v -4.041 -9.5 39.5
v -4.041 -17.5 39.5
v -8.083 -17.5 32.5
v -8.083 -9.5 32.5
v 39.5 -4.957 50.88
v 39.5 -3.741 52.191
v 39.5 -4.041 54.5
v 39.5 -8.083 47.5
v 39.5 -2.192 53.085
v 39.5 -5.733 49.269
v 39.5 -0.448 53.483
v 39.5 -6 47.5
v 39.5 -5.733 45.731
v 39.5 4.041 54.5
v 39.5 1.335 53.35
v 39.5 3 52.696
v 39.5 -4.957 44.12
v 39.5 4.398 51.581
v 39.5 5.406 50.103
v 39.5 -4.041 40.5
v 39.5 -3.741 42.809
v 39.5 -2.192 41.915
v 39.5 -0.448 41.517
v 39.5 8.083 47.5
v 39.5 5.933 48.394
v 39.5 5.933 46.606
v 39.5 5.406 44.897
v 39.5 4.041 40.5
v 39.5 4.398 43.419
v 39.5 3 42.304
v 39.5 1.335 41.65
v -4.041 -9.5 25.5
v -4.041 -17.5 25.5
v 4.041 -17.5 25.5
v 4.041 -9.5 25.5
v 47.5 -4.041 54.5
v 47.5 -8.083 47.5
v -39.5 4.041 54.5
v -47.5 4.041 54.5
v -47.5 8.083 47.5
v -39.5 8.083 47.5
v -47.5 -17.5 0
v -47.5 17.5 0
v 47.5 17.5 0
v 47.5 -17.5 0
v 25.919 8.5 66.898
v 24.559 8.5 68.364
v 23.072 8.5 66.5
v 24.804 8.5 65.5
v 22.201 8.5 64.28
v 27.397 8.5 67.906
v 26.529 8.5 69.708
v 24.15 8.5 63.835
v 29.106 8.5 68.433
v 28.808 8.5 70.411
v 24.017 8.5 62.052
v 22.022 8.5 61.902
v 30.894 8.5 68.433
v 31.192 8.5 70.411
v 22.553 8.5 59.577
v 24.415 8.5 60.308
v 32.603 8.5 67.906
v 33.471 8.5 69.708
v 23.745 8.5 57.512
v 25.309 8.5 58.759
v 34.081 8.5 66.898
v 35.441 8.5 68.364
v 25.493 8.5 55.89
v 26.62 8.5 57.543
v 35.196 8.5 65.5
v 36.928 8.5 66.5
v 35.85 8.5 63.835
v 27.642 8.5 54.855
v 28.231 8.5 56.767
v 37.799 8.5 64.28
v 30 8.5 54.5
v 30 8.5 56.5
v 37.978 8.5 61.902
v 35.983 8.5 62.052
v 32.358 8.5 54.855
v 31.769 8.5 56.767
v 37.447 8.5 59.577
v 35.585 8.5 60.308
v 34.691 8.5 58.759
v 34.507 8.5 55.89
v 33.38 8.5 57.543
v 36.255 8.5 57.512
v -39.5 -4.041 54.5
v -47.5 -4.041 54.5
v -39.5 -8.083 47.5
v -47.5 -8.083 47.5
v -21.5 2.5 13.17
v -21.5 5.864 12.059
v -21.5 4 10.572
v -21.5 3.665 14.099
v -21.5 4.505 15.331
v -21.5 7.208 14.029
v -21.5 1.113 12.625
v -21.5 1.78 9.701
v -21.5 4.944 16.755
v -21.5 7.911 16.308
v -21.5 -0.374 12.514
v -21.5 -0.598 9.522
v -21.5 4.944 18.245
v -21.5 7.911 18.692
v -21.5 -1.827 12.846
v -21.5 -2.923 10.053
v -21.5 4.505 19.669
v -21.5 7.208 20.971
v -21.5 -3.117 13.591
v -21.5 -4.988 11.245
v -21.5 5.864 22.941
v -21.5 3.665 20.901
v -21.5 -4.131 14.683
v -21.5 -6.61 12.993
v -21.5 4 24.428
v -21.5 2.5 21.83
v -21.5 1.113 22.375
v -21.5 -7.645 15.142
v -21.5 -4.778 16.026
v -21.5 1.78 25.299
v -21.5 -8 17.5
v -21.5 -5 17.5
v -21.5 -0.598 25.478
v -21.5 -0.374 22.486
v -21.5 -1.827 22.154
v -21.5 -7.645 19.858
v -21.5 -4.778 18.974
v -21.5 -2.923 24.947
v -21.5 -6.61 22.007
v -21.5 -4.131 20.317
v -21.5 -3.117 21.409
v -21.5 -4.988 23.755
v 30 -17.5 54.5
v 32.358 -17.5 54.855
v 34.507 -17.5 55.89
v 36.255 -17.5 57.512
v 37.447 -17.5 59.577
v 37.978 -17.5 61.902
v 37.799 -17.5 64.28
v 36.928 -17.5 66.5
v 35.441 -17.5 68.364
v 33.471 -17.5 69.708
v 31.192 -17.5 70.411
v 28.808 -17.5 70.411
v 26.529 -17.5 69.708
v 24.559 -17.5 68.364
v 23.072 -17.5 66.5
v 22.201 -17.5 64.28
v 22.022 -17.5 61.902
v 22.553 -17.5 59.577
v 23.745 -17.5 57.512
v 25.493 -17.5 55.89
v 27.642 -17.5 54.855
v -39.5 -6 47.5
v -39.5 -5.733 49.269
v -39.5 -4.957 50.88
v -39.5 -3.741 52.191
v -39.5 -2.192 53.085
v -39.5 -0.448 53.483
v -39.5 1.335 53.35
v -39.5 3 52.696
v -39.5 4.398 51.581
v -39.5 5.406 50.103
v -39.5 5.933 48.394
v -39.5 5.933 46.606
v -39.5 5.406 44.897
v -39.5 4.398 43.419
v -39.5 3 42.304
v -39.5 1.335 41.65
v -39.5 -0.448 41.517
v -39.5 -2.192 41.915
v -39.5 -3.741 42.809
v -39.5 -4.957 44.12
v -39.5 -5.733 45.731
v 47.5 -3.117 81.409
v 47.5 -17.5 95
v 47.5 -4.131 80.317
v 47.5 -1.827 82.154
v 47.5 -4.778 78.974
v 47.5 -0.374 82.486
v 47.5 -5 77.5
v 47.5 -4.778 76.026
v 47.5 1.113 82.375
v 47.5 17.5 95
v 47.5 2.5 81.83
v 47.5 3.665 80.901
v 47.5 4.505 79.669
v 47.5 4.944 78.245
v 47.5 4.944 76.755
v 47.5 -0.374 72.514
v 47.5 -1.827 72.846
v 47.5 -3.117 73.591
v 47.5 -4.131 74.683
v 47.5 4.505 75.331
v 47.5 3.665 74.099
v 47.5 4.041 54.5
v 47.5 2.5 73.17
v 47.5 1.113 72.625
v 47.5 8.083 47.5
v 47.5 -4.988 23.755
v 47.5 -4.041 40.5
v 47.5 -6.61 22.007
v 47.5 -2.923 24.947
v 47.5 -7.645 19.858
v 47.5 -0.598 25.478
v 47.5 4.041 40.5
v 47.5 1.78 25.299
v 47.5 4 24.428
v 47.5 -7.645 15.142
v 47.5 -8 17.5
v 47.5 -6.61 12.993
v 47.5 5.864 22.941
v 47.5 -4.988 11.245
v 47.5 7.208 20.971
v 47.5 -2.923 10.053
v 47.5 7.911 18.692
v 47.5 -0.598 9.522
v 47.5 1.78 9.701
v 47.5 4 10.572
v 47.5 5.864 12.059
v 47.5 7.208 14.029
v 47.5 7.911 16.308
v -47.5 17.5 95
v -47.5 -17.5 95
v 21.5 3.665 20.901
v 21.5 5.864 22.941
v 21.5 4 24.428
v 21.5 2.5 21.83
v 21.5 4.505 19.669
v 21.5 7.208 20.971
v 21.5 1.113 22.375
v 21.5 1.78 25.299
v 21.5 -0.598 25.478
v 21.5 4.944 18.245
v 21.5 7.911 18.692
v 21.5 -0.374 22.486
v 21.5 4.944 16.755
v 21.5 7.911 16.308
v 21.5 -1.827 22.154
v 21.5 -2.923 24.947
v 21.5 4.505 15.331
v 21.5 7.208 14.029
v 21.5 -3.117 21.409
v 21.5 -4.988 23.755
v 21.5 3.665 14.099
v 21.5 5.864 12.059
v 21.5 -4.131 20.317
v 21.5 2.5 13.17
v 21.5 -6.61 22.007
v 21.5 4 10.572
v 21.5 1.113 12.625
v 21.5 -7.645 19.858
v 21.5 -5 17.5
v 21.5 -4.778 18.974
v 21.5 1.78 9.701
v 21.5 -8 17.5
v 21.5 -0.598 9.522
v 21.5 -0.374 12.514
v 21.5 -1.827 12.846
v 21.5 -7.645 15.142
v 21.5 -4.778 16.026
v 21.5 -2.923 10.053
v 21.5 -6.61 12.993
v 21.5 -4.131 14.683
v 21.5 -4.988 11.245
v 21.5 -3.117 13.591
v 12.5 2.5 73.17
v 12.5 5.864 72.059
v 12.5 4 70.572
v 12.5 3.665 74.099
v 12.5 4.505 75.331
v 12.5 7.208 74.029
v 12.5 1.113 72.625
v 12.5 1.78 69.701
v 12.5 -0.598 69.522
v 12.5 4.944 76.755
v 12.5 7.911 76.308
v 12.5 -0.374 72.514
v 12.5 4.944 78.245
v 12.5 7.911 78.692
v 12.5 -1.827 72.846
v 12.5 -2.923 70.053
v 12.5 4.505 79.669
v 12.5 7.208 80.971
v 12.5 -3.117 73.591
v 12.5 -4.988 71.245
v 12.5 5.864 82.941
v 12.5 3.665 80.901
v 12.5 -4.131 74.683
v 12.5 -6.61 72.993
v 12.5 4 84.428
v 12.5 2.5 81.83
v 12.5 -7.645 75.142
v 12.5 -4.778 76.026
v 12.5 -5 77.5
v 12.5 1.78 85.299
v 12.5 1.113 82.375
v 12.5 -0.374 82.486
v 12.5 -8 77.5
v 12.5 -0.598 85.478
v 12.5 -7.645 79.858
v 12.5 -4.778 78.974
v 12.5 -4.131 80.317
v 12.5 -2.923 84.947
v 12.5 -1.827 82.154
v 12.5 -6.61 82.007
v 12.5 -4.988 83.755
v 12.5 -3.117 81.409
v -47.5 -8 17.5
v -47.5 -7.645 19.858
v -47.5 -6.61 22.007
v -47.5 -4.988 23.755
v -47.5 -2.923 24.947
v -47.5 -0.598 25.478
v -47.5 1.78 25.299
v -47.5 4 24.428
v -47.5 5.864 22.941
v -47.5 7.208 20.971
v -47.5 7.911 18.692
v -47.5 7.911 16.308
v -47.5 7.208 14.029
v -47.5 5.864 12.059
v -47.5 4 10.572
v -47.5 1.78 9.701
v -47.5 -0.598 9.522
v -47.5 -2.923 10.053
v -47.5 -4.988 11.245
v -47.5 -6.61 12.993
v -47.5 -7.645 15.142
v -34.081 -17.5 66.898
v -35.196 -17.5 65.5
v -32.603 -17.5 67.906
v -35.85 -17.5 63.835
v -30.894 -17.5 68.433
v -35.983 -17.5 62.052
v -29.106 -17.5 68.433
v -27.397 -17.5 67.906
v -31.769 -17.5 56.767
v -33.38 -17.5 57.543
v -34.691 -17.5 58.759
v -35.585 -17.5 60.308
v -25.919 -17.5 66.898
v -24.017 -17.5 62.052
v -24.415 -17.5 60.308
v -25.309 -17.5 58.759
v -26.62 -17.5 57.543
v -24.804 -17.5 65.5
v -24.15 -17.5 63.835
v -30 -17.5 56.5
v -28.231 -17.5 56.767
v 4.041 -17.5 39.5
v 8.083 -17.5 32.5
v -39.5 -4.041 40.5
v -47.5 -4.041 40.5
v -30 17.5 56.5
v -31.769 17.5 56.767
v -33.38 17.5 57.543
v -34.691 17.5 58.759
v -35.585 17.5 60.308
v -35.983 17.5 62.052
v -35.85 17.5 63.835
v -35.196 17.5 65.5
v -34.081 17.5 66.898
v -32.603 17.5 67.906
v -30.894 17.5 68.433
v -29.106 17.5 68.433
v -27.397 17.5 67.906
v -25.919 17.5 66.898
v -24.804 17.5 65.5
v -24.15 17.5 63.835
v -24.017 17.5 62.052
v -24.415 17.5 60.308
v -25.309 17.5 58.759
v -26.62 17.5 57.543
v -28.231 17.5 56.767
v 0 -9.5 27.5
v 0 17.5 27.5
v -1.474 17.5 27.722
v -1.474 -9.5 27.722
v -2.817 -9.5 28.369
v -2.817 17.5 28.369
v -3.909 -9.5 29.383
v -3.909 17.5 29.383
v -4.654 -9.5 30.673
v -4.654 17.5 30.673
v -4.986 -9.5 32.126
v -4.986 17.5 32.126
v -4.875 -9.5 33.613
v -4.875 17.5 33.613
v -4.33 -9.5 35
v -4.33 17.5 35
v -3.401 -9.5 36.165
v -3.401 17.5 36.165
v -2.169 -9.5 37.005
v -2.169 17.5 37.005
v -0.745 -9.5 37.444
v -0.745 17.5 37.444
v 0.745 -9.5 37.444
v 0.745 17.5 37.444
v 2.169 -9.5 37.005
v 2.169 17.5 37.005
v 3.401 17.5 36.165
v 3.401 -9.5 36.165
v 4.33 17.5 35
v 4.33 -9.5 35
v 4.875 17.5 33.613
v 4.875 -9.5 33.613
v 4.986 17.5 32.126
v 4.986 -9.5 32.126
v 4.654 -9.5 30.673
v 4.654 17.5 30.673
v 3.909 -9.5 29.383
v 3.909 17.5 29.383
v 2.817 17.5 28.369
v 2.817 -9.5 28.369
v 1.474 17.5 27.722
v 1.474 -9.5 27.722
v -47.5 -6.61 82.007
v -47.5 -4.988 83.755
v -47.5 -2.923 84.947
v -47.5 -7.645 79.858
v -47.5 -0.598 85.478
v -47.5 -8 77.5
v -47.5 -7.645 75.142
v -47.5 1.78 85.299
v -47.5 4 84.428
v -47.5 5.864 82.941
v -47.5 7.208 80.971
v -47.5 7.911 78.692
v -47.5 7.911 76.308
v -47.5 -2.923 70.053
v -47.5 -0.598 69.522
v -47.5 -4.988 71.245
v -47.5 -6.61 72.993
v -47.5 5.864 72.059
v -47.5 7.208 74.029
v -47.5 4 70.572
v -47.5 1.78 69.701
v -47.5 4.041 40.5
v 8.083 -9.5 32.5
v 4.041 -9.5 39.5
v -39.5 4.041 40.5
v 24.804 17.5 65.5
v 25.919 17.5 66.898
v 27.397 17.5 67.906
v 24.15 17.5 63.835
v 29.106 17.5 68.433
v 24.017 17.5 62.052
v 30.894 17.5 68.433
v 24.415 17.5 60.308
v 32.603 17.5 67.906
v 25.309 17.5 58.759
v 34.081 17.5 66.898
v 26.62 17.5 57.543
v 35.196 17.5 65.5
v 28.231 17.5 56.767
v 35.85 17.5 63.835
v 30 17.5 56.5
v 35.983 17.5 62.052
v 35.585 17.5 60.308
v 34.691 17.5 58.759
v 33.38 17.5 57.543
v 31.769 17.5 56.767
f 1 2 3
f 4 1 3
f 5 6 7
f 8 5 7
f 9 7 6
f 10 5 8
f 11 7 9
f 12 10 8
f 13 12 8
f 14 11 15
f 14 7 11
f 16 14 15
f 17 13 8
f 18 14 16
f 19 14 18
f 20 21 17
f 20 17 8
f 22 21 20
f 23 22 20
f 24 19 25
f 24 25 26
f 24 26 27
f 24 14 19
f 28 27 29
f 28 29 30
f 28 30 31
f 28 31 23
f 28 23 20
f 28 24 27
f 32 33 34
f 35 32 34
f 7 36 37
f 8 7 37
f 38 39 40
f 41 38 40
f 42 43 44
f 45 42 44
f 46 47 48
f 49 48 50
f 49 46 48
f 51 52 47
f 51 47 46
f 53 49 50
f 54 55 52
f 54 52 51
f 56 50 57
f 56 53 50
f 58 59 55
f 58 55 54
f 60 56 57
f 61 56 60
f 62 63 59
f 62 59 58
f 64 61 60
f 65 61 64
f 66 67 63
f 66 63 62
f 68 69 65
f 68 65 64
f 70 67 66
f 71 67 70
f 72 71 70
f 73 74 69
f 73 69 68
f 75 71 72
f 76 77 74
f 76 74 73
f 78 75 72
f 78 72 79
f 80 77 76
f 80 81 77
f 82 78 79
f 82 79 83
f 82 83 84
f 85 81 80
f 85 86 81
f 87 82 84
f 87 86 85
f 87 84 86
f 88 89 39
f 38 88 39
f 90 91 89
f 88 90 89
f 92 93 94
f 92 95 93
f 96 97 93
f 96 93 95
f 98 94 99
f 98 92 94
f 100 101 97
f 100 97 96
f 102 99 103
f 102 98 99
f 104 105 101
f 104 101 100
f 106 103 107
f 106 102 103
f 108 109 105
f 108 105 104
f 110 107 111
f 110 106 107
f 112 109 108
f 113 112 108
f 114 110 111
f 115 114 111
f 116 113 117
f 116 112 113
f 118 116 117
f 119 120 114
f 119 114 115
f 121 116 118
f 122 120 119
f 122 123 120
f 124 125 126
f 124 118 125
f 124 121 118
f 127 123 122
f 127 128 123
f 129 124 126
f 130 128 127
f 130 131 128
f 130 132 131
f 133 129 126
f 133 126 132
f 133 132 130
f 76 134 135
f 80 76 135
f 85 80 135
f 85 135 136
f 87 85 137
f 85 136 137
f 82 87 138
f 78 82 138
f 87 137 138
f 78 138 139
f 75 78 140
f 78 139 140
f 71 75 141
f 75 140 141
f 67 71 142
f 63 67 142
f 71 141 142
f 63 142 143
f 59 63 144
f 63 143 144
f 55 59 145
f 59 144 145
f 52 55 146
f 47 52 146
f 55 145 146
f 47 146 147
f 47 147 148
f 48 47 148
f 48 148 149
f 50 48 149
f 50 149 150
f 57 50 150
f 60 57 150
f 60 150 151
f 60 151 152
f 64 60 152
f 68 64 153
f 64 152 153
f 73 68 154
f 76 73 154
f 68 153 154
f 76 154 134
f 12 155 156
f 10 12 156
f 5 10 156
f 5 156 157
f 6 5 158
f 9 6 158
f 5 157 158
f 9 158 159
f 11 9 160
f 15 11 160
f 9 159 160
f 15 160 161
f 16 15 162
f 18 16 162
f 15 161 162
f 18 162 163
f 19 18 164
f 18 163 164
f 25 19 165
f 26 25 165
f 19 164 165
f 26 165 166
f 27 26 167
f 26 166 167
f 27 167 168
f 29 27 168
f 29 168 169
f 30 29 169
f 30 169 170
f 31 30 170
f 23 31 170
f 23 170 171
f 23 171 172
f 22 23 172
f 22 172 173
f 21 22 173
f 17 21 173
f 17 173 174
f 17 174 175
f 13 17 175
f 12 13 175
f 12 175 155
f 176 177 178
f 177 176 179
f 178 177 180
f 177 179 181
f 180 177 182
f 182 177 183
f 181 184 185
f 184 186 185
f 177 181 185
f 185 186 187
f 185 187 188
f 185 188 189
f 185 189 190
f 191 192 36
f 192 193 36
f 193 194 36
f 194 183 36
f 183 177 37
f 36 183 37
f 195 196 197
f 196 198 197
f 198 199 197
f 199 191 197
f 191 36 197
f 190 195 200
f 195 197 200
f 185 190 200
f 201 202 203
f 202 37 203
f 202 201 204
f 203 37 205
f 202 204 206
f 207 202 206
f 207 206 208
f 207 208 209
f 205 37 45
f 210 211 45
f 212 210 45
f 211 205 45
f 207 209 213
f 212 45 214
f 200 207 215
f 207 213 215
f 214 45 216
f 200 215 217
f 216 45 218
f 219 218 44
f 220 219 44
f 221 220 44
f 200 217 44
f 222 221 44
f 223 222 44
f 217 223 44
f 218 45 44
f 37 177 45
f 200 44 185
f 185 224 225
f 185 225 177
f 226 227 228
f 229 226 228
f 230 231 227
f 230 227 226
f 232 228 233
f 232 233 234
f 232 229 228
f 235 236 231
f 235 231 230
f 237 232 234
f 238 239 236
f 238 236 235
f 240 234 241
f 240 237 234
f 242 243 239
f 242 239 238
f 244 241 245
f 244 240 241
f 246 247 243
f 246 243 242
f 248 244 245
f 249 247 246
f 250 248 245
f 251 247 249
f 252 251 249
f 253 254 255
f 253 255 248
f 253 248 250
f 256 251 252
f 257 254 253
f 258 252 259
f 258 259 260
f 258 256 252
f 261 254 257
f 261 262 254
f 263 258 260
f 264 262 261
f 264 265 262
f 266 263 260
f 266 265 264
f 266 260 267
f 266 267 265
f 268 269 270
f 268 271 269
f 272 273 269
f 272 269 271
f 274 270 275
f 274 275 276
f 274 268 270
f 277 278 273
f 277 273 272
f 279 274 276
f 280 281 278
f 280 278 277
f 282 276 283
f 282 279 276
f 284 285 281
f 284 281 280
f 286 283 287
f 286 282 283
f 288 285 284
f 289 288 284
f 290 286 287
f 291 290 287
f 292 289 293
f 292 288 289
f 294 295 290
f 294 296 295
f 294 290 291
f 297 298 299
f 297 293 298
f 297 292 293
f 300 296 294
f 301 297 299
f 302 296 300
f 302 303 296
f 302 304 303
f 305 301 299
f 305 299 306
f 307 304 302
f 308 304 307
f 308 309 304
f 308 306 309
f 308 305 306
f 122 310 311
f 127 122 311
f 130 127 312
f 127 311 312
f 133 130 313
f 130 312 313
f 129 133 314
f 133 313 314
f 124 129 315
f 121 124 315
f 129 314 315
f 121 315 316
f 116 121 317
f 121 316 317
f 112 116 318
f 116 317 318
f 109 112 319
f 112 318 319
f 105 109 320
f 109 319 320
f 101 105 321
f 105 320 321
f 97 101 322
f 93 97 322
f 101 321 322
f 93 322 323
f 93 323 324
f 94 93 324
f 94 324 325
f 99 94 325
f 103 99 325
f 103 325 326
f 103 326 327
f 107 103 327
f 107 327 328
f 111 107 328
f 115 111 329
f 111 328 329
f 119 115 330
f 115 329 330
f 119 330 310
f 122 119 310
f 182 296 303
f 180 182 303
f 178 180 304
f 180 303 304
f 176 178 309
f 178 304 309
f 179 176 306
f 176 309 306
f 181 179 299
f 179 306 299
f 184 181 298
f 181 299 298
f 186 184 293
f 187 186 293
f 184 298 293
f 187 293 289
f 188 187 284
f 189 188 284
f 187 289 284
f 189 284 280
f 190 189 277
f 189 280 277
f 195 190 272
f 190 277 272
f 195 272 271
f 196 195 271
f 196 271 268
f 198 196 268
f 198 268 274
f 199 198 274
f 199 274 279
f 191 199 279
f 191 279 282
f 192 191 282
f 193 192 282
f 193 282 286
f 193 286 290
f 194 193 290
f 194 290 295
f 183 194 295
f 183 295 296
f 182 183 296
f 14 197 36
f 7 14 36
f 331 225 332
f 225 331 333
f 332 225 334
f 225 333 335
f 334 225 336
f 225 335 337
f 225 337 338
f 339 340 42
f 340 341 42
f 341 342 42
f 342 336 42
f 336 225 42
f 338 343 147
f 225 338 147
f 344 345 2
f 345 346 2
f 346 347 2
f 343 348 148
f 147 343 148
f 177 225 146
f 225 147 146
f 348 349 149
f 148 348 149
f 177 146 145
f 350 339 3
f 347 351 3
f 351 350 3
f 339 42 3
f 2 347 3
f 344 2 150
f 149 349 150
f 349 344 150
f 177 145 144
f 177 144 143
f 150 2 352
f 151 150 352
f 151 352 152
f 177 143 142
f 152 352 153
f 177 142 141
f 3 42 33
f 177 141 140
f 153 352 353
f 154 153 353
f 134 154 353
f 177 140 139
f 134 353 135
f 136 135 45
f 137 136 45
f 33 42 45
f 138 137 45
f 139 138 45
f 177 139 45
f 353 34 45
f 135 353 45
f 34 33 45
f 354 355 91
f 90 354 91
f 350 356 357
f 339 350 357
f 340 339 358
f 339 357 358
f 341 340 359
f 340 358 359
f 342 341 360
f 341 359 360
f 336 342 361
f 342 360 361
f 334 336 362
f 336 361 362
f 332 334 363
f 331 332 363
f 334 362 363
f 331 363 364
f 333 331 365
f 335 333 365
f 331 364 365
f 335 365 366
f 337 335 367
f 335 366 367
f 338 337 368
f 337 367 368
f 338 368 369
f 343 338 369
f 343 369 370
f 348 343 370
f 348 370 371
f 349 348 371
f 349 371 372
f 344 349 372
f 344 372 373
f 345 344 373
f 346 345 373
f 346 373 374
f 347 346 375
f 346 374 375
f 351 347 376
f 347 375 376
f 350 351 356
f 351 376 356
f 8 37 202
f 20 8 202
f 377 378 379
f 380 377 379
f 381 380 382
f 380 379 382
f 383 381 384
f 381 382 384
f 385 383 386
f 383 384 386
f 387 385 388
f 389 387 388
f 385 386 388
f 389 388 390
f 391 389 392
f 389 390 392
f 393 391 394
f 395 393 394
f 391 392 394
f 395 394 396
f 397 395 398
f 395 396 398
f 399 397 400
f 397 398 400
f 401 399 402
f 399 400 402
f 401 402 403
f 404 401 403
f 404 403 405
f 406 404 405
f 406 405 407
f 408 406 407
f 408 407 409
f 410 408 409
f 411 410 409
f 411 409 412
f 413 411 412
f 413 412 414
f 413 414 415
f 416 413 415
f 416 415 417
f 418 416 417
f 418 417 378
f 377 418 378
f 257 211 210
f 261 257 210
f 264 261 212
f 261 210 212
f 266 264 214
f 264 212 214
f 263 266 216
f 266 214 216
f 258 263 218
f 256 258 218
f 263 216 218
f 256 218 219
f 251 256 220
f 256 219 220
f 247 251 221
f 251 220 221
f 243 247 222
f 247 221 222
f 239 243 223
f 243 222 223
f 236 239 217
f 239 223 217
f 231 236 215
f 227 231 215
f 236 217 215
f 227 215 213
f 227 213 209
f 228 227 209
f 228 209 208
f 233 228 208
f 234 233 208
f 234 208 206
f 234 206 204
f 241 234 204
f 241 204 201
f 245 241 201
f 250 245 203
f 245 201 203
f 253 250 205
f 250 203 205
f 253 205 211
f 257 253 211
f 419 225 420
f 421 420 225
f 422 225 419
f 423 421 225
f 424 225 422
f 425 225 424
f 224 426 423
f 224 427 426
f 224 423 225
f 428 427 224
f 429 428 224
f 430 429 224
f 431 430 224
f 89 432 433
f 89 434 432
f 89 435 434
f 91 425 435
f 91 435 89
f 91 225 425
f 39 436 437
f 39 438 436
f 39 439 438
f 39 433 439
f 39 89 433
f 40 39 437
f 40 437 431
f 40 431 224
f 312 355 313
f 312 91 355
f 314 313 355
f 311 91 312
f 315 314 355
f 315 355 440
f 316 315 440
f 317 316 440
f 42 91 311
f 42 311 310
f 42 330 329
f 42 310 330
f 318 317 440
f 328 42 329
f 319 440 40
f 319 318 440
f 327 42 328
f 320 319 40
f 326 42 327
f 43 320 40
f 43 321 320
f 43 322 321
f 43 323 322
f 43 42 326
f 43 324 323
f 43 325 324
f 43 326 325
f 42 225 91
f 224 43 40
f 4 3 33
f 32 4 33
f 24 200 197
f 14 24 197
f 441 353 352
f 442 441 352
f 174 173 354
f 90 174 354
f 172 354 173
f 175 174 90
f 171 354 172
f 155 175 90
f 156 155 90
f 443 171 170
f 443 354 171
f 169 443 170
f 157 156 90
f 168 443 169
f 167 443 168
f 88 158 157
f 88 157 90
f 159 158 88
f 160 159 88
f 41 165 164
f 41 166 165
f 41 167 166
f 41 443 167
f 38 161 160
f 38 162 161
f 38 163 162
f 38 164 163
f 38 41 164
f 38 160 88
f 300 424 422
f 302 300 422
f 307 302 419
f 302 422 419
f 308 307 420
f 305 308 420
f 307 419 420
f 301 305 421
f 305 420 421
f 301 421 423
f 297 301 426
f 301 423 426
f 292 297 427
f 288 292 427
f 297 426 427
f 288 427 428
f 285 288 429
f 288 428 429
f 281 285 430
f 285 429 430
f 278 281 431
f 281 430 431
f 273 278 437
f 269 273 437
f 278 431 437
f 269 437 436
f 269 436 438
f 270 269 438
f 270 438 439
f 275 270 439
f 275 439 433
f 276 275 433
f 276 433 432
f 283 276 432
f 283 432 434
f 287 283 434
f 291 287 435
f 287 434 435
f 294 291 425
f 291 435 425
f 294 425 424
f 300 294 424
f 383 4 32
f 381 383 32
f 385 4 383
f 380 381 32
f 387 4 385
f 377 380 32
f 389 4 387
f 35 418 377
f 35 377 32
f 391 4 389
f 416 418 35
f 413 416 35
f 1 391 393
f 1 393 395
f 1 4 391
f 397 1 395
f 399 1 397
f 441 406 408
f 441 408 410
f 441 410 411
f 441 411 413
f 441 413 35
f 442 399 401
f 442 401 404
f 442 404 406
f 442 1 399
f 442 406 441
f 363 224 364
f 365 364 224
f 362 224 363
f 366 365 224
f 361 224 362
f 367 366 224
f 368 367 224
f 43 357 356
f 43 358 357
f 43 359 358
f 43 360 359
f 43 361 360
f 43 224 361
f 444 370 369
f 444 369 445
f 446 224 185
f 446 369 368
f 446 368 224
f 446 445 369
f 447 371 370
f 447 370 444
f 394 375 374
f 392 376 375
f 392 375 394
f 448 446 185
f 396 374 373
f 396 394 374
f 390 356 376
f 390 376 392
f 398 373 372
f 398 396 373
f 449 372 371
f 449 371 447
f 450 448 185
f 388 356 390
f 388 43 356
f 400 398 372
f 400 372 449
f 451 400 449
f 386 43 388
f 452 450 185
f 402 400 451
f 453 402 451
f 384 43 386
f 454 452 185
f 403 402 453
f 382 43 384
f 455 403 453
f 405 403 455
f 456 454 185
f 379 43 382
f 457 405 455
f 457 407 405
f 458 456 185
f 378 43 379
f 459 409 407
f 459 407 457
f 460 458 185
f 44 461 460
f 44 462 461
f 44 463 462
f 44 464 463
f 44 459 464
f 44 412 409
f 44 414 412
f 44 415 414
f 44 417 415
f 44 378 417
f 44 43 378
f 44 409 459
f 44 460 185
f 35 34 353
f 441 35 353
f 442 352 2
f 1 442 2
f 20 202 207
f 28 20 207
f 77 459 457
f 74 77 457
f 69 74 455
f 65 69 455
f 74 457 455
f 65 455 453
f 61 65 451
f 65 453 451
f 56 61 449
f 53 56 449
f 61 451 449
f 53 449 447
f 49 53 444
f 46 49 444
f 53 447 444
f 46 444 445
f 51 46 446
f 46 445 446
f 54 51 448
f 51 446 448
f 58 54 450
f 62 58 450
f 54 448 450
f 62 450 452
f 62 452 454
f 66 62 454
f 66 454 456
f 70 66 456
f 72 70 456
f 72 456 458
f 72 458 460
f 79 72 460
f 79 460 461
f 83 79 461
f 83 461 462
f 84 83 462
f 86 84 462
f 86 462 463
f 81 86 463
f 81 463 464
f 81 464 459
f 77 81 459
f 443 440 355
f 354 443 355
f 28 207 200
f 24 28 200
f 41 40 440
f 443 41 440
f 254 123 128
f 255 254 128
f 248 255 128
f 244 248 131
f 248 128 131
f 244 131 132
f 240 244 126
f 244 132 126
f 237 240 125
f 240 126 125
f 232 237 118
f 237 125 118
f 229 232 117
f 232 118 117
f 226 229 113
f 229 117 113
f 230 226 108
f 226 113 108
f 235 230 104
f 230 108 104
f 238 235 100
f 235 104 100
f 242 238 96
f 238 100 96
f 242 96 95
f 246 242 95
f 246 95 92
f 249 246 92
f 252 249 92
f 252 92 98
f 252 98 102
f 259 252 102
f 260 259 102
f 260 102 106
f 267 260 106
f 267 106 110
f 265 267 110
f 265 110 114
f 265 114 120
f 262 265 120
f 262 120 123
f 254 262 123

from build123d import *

# Parameters (mm, degrees)
SKETCH1_W           = 95
SKETCH1_H           = 35
BOSS_EXTRUDE1_DEPTH = 95
SKETCH2_R           = 5
SKETCH2_R_2         = 6
CUT_EXTRUDE1_DEPTH  = 95
SKETCH3_R           = 8
CUT_EXTRUDE2_DEPTH  = 26
SKETCH4_R           = 8
CUT_EXTRUDE3_DEPTH  = 60
SKETCH5_R           = 8
CUT_EXTRUDE4_DEPTH  = 26
SKETCH6_R           = 5
SKETCH6_R_2         = 6
CUT_EXTRUDE5_DEPTH  = 35
SKETCH8_R           = 8
CUT_EXTRUDE7_DEPTH  = 26
CUT_EXTRUDE10_DEPTH = 8
CUT_EXTRUDE14_DEPTH = 8
CUT_EXTRUDE15_DEPTH = 8


with BuildPart() as part:
    # Sketch1 → Boss-Extrude1 (new body)
    with BuildSketch(Plane.XY):
        Rectangle(SKETCH1_W, SKETCH1_H)
    extrude(amount=BOSS_EXTRUDE1_DEPTH)

    # Sketch2 → Cut-Extrude1 (cut)
    with BuildSketch(Plane.ZY.offset(47.5)):
        with Locations(Location((17.5, 0, 0), (0, 0, 270))):  # turned: the seam where the file's is
            Circle(SKETCH2_R)
        with Locations(Location((47.5, 0, 0), (0, 0, 270))):  # turned: the seam where the file's is
            Circle(SKETCH2_R_2)
        with Locations(Location((77.5, 0, 0), (0, 0, 270))):  # turned: the seam where the file's is
            Circle(SKETCH2_R)
    extrude(amount=-CUT_EXTRUDE1_DEPTH, mode=Mode.SUBTRACT)

    # Sketch3 → Cut-Extrude2 (cut)
    with BuildSketch(Plane.ZY.offset(47.5)):
        with Locations(Location((17.5, 0, 0), (0, 0, 270))):  # turned: the seam where the file's is
            Circle(SKETCH3_R)
    extrude(amount=-CUT_EXTRUDE2_DEPTH, mode=Mode.SUBTRACT)

    # Sketch4 → Cut-Extrude3 (cut)
    with BuildSketch(Plane.ZY.offset(47.5)):
        with Locations(Location((77.5, 0, 0), (0, 0, 270))):  # turned: the seam where the file's is
            Circle(SKETCH4_R)
    extrude(amount=-CUT_EXTRUDE3_DEPTH, mode=Mode.SUBTRACT)

    # Sketch5 → Cut-Extrude4 (cut)
    with BuildSketch(Plane(origin=(47.5, 0, 0), x_dir=(0, 0, -1), z_dir=(1, 0, 0))):
        with Locations(Location((-17.5, 0, 0), (0, 0, 270))):  # turned: the seam where the file's is
            Circle(SKETCH5_R)
    extrude(amount=-CUT_EXTRUDE4_DEPTH, mode=Mode.SUBTRACT)

    # Sketch6 → Cut-Extrude5 (cut)
    with BuildSketch(Plane(origin=(0, 17.5, 0), x_dir=(1, 0, 0), z_dir=(0, 1, 0))):
        with Locations(Location((0, -32.5, 0), (0, 0, 90))):  # turned: the seam where the file's is
            Circle(SKETCH6_R)
        with Locations(Location((-30, -62.5, 0), (0, 0, 90))):  # turned: the seam where the file's is
            Circle(SKETCH6_R_2)
        with Locations(Location((30, -62.5, 0), (0, 0, 90))):  # turned: the seam where the file's is
            Circle(SKETCH6_R_2)
    extrude(amount=-CUT_EXTRUDE5_DEPTH, mode=Mode.SUBTRACT)

    # Sketch8 → Cut-Extrude7 (cut)
    with BuildSketch(Plane.XZ.offset(17.5)):
        with Locations(Location((30, 62.5, 0), (0, 0, 270))):  # turned: the seam where the file's is
            Circle(SKETCH8_R)
    extrude(amount=-CUT_EXTRUDE7_DEPTH, mode=Mode.SUBTRACT)

    # Sketch12 → Cut-Extrude10 (cut)
    with BuildSketch(Plane.XZ.offset(17.5)):
        Polygon((8.082903769, 32.5), (4.041451884, 39.5), (-4.041451884, 39.5), (-8.082903769, 32.5), (-4.041451884, 25.5), (4.041451884, 25.5), align=None)
    extrude(amount=-CUT_EXTRUDE10_DEPTH, mode=Mode.SUBTRACT)

    # Sketch16 → Cut-Extrude14 (cut)
    with BuildSketch(Plane.ZY.offset(47.5)):
        Polygon((47.5, -8.082903769), (54.5, -4.041451884), (54.5, 4.041451884), (47.5, 8.082903769), (40.5, 4.041451884), (40.5, -4.041451884), align=None)
    extrude(amount=-CUT_EXTRUDE14_DEPTH, mode=Mode.SUBTRACT)

    # Sketch17 → Cut-Extrude15 (cut)
    with BuildSketch(Plane(origin=(47.5, 0, 0), x_dir=(0, 0, -1), z_dir=(1, 0, 0))):
        Polygon((-47.5, -8.082903769), (-40.5, -4.041451884), (-40.5, 4.041451884), (-47.5, 8.082903769), (-54.5, 4.041451884), (-54.5, -4.041451884), align=None)
    extrude(amount=-CUT_EXTRUDE15_DEPTH, mode=Mode.SUBTRACT)


solid = part.part
